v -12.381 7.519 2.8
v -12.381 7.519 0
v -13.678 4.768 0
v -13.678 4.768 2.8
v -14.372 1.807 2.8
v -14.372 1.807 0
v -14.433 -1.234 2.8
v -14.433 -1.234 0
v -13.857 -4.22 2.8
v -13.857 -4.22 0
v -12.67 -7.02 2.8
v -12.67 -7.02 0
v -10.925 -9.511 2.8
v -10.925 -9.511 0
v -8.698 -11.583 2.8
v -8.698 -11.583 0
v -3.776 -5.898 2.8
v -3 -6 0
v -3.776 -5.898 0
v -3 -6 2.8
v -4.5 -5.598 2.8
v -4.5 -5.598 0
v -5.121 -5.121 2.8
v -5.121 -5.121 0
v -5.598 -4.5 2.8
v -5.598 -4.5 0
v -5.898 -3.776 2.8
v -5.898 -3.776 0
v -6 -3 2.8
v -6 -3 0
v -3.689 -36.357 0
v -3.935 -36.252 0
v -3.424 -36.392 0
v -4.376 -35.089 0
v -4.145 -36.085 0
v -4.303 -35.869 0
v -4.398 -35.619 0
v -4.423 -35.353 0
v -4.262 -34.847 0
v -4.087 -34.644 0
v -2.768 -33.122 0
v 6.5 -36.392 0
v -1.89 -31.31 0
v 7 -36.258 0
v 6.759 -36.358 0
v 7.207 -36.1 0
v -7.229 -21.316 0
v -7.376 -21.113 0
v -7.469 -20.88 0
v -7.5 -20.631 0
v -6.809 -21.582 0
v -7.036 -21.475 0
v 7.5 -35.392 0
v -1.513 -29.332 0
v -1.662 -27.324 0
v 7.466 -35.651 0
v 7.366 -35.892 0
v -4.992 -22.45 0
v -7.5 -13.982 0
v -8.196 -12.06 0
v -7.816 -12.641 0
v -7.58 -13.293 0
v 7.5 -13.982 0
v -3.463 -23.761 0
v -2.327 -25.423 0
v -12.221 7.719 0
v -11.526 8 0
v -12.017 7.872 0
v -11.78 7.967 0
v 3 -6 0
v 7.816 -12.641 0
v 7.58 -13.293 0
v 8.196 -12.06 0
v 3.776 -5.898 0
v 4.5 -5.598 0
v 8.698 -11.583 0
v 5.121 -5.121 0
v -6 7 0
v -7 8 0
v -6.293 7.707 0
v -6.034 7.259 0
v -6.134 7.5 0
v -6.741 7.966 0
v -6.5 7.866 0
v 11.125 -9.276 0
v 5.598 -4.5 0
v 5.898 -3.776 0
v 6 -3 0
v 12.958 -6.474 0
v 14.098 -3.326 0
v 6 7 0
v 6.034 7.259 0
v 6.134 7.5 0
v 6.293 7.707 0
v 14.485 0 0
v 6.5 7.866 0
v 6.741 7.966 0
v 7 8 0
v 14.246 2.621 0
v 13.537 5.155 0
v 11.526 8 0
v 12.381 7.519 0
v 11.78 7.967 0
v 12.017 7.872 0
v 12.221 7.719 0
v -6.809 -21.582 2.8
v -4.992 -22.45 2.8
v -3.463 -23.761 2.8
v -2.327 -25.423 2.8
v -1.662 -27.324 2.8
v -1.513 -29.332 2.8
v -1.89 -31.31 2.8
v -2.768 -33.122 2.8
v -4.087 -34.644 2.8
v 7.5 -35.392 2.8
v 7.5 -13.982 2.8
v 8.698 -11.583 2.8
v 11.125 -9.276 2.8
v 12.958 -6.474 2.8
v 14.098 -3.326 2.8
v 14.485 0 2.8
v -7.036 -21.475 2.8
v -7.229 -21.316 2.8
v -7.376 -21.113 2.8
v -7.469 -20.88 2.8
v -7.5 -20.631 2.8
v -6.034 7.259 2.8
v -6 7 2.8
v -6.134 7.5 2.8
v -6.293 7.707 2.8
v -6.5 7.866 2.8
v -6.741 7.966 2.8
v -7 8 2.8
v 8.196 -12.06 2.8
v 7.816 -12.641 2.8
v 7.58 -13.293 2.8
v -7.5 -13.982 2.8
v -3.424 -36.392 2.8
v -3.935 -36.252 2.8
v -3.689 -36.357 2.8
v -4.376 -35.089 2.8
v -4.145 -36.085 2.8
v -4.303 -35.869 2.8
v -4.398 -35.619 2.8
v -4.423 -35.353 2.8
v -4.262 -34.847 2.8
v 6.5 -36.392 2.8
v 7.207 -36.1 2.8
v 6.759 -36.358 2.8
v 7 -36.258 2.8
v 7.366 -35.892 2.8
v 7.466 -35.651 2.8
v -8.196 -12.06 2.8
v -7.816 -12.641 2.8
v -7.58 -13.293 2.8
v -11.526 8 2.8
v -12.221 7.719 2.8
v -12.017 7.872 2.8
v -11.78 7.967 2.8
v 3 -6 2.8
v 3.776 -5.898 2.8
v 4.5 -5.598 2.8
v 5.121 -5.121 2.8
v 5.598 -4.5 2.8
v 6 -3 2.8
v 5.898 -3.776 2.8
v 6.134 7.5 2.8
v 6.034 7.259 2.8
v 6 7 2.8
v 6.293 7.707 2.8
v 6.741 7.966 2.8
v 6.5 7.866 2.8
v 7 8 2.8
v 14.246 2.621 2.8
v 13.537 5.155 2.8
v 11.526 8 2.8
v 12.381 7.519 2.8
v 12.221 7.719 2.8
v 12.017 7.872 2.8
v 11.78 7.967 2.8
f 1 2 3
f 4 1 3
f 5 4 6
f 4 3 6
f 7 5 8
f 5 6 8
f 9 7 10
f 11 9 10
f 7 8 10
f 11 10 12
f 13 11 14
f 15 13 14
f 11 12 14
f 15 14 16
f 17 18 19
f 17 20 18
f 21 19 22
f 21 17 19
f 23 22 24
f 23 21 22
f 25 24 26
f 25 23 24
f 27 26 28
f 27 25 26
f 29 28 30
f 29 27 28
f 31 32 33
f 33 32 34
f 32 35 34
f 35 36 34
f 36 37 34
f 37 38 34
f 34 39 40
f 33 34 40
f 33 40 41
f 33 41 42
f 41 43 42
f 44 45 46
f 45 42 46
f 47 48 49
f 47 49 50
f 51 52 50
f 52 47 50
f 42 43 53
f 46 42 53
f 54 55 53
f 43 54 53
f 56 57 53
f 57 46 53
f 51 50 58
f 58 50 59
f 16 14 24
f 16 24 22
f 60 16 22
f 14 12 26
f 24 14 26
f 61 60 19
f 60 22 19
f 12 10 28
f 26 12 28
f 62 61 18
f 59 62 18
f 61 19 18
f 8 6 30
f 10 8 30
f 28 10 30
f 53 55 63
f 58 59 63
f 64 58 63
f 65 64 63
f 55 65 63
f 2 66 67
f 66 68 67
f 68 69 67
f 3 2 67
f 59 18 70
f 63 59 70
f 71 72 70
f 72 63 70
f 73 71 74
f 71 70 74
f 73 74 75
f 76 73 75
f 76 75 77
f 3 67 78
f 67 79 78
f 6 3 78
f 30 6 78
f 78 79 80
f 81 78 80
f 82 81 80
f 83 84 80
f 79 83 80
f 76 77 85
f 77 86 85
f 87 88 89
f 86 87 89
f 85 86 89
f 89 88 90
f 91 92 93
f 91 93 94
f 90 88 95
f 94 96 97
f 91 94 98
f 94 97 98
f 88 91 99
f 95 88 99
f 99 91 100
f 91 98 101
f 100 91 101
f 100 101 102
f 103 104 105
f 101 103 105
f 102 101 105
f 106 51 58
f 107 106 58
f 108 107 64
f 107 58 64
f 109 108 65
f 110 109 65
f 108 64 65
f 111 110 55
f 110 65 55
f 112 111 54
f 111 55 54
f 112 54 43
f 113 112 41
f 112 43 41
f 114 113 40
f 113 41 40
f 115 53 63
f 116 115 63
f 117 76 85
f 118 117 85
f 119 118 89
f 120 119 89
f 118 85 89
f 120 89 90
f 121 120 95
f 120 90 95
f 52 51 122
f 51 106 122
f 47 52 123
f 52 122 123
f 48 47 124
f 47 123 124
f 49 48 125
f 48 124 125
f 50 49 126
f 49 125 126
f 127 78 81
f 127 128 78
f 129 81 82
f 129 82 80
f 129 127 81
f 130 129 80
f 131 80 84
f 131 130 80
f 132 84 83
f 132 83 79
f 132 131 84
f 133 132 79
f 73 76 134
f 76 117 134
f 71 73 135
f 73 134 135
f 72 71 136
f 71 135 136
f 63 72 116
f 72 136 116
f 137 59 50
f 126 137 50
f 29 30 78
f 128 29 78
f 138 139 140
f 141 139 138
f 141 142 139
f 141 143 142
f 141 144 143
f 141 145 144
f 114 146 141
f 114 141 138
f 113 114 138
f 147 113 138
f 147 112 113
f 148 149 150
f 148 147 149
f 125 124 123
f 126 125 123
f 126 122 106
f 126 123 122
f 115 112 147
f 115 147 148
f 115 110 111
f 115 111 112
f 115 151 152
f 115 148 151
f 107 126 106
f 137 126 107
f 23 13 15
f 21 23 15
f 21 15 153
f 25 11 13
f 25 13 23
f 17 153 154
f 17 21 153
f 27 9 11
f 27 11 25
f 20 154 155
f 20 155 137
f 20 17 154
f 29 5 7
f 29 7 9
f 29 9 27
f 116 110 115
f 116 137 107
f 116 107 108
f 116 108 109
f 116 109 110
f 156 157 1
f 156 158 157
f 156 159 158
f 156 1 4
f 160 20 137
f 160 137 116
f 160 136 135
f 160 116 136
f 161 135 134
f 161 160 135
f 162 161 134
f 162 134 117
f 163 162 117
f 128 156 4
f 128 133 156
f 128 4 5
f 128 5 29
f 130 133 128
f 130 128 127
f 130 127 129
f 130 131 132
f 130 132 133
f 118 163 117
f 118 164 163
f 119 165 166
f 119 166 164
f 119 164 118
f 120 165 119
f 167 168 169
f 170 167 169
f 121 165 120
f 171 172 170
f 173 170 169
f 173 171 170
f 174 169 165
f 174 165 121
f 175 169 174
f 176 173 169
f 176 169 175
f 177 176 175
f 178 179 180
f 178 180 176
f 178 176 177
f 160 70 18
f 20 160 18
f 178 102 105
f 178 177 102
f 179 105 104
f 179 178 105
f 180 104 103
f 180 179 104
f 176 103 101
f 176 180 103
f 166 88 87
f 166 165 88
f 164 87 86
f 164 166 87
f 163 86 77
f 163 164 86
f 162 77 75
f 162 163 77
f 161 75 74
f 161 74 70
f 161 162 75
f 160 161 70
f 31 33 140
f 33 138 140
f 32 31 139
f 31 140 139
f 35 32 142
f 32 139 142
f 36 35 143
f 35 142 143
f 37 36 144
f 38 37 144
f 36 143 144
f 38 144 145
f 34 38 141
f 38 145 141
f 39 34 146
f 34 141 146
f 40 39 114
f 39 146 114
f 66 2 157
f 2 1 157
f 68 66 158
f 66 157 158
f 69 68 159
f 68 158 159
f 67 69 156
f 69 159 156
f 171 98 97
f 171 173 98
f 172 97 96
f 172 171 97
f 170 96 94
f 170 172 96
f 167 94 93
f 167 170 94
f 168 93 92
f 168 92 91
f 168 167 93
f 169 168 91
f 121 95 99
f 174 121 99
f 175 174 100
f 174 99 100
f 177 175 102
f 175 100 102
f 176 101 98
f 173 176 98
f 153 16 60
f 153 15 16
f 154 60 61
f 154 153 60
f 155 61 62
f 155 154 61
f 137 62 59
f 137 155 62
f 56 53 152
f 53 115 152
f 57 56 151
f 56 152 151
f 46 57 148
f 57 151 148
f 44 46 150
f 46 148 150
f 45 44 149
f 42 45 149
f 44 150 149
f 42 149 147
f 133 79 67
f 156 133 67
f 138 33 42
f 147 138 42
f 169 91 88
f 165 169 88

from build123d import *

# Parameters (mm, degrees)
F1_DEPTH = 2.8
F2_R     = 3
F3_R     = 1


with BuildPart() as f1:
    # F0 (on Top) → F1 (new body)
    with BuildSketch(Plane.XY):
        with BuildLine():
            ThreePointArc((7.5, -12.3924725737), (12.6186961846, -7.1127971356), (14.4852813742, 0))
            ThreePointArc((14.4852813742, 0), (13.869819685, 4.1774966664), (12.075735029, 8))
            Line((12.075735029, 8), (6, 8))
            Line((6, 8), (6, 6))
            Line((6, 6), (6, -6))
            Line((6, -6), (-6, -6))
            Line((-6, -6), (-6, 6))
            Line((-6, 6), (-6, 8))
            Line((-6, 8), (-12.075735029, 8))
            ThreePointArc((-12.075735029, 8), (-14.1338453684, -3.1714021492), (-7.5, -12.3924725737))
            Line((-7.5, -12.3924725737), (7.5, -12.3924725737))
        make_face()
        with BuildLine():
            Line((7.5, -36.3924725737), (7.5, -12.3924725737))
            ThreePointArc((7.5, -12.3924725737), (0, -14.4852813742), (-7.5, -12.3924725737))
            Line((-7.5, -12.3924725737), (-7.5, -21.3924725737))
            ThreePointArc((-7.5, -21.3924725737), (-1.5, -28.8924725737), (-7.5, -36.3924725737))
            Line((-7.5, -36.3924725737), (7.5, -36.3924725737))
        make_face()
        with BuildLine():
            ThreePointArc((-7.5, -12.3924725737), (0, -14.4852813742), (7.5, -12.3924725737))
            Line((7.5, -12.3924725737), (-7.5, -12.3924725737))
        make_face()
    extrude(amount=F1_DEPTH)

    # F2
    f2_edges = [f1.edges().sort_by_distance(p)[0] for p in [
        (-7.5, -12.392473, 1.4),
        (7.5, -12.392473, 1.4),
        (6, -6, 1.4),
        (-6, -6, 1.4),
    ]]
    fillet(f2_edges, radius=F2_R)

    # F3
    f3_edges = [f1.edges().sort_by_distance(p)[0] for p in [
        (-7.5, -36.392473, 1.4),
        (7.5, -36.392473, 1.4),
        (6, 8, 1.4),
        (-6, 8, 1.4),
        (-12.075735, 8, 1.4),
        (12.075735, 8, 1.4),
        (-7.5, -21.392473, 1.4),
    ]]
    fillet(f3_edges, radius=F3_R)


solid = f1.part
